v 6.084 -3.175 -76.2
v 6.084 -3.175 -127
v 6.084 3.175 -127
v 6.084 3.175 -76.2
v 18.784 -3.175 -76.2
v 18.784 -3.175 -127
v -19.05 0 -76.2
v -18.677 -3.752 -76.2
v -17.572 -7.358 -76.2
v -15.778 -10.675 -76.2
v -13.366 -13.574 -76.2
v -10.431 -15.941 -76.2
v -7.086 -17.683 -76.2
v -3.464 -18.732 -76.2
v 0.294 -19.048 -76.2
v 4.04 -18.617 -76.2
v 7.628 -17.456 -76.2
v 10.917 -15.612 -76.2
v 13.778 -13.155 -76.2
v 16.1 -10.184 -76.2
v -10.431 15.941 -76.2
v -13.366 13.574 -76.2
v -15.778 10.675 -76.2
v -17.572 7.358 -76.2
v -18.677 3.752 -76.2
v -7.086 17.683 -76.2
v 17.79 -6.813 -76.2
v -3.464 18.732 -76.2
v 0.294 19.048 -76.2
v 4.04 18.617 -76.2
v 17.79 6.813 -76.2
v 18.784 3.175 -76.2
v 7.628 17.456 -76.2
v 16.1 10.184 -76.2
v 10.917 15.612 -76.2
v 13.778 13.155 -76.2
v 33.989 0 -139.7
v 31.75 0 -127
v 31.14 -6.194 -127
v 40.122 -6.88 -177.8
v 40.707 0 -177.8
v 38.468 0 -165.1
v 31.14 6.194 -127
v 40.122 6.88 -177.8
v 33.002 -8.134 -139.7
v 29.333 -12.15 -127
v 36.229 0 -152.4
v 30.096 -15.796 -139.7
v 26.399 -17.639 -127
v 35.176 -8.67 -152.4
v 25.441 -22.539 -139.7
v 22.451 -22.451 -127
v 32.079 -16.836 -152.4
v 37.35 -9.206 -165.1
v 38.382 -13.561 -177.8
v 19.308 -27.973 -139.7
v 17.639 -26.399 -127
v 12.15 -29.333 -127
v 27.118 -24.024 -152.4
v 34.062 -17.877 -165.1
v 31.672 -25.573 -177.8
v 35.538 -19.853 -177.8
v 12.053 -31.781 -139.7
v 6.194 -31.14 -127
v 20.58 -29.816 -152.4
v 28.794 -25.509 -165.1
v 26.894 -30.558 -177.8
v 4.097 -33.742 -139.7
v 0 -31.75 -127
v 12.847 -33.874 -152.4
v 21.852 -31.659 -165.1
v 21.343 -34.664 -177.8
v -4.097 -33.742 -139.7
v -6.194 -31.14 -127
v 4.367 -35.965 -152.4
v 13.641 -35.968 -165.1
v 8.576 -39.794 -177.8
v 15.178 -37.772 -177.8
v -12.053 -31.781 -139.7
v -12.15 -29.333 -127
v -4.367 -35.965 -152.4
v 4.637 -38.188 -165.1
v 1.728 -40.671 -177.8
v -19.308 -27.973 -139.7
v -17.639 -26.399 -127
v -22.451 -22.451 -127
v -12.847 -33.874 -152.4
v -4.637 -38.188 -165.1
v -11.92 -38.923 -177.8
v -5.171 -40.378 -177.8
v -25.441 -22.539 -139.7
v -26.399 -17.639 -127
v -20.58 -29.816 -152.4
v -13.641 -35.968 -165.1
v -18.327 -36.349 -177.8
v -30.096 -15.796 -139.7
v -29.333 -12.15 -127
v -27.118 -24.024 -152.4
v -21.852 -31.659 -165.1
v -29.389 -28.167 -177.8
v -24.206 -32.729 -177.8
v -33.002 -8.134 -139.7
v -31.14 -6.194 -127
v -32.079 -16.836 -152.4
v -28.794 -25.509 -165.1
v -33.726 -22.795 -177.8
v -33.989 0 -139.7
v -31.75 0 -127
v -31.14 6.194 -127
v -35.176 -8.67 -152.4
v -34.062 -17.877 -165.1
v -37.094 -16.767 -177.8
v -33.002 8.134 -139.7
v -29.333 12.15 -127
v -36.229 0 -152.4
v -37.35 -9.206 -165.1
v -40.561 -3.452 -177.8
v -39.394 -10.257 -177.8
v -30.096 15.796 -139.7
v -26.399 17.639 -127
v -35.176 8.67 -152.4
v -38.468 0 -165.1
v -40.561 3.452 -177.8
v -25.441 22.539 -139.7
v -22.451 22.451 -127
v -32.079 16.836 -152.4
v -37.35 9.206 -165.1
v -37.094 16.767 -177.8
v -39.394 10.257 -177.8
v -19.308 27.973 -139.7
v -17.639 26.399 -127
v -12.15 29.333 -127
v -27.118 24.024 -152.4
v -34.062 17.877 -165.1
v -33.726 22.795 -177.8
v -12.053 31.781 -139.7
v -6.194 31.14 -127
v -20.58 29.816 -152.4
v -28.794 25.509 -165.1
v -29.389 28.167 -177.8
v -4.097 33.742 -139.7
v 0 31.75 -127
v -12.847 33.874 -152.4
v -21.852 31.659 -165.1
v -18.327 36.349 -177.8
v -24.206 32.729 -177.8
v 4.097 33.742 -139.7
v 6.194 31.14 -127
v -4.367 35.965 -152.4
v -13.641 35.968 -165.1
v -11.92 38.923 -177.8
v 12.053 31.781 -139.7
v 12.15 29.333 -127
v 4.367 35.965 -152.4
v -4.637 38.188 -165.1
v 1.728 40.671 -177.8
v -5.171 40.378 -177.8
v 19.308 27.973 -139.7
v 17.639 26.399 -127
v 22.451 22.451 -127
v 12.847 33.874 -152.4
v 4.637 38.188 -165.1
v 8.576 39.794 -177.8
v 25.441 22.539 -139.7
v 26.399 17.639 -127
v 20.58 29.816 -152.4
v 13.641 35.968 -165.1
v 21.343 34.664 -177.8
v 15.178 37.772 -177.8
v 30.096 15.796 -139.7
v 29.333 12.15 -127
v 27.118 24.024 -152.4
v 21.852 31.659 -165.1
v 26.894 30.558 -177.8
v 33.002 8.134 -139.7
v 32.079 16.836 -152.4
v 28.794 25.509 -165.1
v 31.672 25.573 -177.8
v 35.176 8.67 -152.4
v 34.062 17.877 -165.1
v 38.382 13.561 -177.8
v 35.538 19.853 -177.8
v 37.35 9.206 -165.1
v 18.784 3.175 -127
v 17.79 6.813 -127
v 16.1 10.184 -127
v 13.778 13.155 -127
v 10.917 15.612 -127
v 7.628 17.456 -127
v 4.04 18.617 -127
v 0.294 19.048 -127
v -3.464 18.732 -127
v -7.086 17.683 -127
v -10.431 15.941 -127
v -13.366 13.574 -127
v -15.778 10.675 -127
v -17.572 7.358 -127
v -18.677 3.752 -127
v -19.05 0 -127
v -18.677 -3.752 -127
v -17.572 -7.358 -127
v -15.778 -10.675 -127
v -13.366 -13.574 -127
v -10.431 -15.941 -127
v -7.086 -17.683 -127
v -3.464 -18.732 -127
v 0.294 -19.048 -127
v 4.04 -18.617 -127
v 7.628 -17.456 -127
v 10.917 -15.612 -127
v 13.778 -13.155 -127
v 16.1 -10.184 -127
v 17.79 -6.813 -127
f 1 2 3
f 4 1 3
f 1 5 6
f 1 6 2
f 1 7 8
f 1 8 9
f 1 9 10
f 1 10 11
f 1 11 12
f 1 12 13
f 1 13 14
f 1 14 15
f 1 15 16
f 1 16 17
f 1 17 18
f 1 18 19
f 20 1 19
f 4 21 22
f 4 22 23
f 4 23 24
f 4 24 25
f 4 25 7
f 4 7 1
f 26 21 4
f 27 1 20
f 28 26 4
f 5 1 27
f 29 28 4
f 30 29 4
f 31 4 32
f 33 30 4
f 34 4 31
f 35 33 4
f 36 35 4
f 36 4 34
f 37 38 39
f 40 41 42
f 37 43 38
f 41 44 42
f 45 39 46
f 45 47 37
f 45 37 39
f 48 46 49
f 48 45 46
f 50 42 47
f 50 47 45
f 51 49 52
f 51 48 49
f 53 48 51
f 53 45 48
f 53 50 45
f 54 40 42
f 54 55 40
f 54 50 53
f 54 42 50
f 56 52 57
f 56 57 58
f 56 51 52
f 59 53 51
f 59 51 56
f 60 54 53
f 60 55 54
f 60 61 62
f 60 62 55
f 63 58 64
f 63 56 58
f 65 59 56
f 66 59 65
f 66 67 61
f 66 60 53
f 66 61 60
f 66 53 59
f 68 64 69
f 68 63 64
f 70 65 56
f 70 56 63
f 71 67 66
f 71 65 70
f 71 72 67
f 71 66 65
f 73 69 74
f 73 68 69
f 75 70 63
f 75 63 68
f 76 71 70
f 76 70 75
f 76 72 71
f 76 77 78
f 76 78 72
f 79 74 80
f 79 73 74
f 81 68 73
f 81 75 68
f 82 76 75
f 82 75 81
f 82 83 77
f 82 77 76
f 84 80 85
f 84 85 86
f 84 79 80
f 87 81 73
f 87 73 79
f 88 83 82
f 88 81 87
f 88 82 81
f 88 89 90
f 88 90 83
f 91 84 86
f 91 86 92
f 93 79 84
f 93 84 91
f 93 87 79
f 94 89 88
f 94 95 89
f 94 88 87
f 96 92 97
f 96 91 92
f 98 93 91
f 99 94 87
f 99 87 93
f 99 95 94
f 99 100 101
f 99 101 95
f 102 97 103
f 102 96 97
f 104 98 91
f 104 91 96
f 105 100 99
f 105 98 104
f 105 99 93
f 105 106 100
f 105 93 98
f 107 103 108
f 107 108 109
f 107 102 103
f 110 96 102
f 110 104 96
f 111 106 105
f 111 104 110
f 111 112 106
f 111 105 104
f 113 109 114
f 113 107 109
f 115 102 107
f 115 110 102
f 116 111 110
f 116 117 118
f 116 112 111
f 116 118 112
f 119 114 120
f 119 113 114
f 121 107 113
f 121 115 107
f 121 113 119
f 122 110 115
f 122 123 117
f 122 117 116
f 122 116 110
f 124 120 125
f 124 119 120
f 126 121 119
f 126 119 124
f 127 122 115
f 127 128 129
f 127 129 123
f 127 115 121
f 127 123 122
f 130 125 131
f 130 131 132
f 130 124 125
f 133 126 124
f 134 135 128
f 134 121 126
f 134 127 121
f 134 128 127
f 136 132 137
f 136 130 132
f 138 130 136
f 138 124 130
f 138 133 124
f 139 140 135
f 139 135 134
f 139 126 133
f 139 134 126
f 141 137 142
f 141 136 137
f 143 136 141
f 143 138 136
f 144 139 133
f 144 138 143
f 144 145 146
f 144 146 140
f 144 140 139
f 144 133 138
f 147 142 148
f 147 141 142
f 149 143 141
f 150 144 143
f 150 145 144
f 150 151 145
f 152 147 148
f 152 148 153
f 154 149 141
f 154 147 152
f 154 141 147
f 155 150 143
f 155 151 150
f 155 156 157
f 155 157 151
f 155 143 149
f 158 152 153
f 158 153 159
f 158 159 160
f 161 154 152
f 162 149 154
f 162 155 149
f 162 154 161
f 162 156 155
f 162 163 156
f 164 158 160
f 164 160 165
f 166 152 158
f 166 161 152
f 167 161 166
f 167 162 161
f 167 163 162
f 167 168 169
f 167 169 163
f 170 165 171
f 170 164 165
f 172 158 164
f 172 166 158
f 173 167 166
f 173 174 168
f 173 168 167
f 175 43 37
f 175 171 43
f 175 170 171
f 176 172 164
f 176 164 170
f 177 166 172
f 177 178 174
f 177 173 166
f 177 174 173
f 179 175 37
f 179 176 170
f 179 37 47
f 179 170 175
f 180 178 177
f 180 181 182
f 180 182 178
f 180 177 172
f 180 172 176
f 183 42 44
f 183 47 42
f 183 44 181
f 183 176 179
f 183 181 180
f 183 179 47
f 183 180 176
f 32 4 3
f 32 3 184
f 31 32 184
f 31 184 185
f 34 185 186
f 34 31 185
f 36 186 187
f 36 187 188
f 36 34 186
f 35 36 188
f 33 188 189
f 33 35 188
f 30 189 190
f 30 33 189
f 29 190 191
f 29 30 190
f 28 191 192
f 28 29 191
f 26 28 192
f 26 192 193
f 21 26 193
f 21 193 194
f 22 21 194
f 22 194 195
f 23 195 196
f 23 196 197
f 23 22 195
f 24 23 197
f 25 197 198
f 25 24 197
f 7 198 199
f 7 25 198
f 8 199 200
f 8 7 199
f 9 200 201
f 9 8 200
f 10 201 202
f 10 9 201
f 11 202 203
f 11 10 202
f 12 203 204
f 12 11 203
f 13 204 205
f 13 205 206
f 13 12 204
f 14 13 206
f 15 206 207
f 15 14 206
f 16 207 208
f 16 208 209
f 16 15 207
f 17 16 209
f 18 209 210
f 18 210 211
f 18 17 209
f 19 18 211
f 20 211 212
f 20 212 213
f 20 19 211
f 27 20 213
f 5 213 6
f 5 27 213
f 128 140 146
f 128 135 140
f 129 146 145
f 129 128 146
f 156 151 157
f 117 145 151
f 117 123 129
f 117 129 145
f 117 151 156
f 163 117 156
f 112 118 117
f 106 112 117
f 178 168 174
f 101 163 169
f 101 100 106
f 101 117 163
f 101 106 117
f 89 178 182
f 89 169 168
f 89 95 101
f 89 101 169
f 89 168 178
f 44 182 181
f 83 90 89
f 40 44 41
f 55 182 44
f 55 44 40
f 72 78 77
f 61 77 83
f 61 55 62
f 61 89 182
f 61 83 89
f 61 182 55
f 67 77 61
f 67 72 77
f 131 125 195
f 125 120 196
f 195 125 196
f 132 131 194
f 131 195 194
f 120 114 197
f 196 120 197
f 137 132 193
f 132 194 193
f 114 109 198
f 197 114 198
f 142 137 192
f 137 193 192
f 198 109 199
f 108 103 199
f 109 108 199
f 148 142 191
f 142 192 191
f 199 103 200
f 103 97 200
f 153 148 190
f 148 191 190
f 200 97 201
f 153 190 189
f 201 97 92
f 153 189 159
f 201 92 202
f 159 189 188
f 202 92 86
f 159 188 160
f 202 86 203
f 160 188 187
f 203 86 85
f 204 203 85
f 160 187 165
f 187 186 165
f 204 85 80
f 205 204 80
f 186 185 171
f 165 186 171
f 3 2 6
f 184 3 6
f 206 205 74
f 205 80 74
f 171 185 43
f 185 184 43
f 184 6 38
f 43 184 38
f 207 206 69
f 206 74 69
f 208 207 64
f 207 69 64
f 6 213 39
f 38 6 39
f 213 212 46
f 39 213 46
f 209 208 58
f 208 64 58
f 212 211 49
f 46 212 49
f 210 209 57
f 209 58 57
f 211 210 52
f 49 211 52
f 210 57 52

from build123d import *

# Parameters (mm, degrees)
F3_DEPTH = 50.8
F4_R     = 31.75
F5_DEPTH = 50.8
F5_TAPER = -10


# Not quite as in the source:
# - the program builds the solid bodies; features that only make, move or delete a surface that nothing else refers to are left out


with BuildPart() as f3:
    # F2 (on face) → F3 (new body)
    with BuildSketch(Plane.XY.offset(-76.2)):
        with BuildLine():
            Line((6.0835533113, 3.175), (18.7835533113, 3.175))
            ThreePointArc((18.7835533113, 3.175), (-19.05, 0), (18.7835533113, -3.175))
            Line((18.7835533113, -3.175), (6.0835533113, -3.175))
            Line((6.0835533113, -3.175), (6.0835533113, 3.175))
        make_face()
    extrude(amount=-F3_DEPTH)

    # F4 (on face) → F5 (join)
    with BuildSketch(Plane(origin=(0, 0, -127), x_dir=(1, 0, 0), z_dir=(0, 0, -1))):
        Circle(F4_R)
    extrude(amount=F5_DEPTH, taper=F5_TAPER)


solid = f3.part
